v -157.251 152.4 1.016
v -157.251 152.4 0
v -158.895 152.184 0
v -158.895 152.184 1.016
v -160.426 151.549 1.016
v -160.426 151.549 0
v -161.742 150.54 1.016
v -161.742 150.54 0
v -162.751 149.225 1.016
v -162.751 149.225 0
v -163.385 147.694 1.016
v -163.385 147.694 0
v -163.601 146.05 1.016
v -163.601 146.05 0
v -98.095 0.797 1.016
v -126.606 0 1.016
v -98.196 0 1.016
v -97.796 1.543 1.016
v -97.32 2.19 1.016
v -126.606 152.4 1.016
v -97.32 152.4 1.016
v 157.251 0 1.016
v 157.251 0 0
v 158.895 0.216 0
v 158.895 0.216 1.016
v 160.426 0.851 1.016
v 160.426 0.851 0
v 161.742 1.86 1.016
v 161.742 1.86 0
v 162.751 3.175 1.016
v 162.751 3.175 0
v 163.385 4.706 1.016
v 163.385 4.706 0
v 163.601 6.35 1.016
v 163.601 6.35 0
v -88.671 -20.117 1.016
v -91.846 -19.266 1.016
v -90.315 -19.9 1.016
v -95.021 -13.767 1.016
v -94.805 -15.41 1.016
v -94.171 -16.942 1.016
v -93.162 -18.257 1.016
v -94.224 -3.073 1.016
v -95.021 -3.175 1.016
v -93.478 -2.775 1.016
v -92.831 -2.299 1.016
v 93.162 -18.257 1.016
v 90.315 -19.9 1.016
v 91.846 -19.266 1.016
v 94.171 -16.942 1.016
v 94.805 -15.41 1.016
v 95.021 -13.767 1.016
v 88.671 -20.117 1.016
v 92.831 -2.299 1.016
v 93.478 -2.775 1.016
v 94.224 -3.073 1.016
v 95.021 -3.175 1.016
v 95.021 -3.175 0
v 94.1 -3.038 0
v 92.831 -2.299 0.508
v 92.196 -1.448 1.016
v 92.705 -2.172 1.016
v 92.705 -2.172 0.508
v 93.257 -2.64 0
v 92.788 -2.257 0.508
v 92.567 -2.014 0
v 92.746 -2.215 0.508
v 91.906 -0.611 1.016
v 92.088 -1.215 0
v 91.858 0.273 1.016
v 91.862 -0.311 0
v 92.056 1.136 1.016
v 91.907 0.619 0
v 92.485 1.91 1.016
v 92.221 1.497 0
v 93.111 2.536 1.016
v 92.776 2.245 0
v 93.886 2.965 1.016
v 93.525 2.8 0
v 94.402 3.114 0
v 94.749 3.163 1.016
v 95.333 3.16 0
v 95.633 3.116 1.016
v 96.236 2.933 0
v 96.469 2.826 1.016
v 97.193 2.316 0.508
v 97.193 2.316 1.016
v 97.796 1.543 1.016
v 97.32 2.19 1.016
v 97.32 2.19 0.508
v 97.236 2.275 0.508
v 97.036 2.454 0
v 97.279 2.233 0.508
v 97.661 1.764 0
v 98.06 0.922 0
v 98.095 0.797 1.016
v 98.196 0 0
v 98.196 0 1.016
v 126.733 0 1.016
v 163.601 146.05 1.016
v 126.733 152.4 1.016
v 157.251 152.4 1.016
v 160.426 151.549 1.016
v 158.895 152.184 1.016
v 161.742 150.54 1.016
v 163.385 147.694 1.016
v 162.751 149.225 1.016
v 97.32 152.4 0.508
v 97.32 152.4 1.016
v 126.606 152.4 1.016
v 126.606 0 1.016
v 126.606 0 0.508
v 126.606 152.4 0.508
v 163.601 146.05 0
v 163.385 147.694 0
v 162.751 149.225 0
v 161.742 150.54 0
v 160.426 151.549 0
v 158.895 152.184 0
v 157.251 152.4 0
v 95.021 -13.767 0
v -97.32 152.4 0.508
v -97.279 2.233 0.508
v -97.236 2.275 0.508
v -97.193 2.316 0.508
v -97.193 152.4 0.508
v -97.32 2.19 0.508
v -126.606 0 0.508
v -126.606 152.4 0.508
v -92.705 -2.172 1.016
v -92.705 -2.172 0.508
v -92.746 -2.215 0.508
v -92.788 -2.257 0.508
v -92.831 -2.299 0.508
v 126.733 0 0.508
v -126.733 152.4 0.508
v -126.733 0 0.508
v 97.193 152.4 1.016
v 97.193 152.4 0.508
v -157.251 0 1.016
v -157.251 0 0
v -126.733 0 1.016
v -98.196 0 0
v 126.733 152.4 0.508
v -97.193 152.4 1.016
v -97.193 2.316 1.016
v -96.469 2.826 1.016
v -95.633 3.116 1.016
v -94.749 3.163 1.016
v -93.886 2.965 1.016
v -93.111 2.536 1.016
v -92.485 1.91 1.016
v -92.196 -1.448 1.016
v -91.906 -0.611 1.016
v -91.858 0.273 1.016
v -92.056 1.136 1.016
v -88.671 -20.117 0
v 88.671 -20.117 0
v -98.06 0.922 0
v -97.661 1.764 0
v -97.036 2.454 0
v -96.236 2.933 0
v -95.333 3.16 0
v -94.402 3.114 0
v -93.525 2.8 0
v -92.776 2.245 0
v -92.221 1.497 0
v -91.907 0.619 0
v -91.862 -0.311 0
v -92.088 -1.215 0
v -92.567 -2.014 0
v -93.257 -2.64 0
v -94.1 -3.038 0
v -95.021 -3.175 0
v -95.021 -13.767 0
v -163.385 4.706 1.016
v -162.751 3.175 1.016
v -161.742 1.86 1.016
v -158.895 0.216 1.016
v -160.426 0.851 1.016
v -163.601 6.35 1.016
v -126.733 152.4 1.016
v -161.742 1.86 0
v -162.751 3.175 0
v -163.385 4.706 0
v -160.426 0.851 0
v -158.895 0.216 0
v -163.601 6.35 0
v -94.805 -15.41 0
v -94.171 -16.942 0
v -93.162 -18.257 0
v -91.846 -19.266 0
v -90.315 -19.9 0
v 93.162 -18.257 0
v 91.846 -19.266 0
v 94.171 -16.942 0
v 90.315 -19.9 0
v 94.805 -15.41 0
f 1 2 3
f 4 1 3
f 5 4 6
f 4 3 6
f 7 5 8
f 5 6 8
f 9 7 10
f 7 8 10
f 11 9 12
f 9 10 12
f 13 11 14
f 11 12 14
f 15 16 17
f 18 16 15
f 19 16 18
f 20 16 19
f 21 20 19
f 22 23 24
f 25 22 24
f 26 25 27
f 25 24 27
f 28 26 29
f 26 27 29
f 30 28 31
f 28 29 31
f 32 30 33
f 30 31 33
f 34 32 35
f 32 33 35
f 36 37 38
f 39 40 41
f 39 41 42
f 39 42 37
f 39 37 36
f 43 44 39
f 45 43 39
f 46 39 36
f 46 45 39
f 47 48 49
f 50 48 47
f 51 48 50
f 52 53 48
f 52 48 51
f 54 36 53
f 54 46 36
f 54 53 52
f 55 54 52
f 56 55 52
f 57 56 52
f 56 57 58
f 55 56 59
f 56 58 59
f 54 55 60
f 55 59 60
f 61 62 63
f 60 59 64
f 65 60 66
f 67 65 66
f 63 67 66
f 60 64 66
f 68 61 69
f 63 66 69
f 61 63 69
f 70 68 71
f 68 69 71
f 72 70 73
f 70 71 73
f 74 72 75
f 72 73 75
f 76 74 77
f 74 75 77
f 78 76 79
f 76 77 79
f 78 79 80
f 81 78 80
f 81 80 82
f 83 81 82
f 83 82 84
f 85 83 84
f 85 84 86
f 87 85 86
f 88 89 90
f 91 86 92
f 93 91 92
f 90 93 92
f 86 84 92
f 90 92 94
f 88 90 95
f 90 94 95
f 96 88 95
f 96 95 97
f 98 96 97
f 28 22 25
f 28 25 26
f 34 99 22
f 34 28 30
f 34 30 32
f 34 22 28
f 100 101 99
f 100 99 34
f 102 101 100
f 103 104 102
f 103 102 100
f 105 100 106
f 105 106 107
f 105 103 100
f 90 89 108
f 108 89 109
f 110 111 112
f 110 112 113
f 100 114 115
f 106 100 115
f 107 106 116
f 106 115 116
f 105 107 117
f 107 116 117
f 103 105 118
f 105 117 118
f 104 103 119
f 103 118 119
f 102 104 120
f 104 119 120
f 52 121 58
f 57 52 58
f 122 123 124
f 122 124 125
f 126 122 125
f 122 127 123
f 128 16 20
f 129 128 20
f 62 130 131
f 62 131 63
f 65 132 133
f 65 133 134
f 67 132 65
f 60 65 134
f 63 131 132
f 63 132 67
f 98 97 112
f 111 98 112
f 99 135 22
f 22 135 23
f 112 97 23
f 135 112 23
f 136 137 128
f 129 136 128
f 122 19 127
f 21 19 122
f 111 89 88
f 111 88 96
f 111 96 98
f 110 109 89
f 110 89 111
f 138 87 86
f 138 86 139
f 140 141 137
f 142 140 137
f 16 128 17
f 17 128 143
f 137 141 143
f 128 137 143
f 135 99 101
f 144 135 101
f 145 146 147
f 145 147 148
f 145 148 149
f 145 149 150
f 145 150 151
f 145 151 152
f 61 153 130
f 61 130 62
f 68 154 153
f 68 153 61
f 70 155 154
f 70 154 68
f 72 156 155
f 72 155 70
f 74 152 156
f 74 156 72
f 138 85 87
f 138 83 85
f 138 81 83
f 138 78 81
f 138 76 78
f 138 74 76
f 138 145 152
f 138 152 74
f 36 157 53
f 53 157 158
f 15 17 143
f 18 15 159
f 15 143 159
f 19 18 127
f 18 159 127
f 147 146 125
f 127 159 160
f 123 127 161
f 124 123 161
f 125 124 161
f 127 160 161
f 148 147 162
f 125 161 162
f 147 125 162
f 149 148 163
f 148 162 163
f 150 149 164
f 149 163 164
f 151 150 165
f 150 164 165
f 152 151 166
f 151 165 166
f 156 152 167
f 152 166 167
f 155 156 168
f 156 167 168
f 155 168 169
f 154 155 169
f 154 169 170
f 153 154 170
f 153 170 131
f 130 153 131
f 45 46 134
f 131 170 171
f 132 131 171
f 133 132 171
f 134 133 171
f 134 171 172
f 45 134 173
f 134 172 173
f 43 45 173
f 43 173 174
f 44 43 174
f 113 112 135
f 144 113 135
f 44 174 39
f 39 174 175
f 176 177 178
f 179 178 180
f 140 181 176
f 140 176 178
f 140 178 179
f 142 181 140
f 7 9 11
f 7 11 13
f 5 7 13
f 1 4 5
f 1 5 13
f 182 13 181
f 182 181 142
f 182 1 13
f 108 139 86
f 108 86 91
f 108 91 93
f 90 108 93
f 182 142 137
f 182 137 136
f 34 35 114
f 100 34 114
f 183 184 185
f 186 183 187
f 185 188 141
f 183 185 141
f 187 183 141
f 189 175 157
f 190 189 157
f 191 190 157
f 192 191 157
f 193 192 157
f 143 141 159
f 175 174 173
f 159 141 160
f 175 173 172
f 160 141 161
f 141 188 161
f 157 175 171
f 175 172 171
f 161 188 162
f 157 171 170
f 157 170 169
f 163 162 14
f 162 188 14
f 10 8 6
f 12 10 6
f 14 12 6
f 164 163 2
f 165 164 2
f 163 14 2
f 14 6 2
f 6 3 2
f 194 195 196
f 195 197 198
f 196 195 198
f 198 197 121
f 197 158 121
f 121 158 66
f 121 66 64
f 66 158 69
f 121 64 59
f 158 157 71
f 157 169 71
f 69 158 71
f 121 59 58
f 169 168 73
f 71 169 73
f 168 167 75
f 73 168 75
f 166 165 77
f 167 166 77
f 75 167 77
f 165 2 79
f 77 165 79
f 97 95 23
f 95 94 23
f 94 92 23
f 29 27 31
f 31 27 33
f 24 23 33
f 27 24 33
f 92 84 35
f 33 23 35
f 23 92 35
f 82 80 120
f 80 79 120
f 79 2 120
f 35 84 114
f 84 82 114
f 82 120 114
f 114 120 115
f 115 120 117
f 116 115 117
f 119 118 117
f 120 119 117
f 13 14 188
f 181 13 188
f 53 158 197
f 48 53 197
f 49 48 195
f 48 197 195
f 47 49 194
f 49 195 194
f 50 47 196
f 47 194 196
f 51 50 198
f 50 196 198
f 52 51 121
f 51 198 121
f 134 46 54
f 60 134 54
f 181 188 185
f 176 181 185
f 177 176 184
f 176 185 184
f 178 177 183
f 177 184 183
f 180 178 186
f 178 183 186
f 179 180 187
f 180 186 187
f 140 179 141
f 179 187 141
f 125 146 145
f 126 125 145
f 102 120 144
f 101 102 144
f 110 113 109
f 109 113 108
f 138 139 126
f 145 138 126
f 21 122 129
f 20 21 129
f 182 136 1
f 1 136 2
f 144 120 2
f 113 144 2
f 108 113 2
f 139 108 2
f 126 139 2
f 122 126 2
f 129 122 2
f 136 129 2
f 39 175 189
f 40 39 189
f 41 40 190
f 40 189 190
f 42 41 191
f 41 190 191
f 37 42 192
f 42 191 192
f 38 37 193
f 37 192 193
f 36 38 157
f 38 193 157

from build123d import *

# Parameters (mm, degrees)
F0_W     = 190.0428
F0_H     = 2.1717
F0_W_2   = 0.127
F0_H_2   = 152.4
F0_H_3   = 0.127
F1_DEPTH = 1.016
F2_W     = 0.127
F2_H     = 152.4
F2_W_2   = 190.0428
F2_H_2   = 0.127
F3_DEPTH = 0.508
F5_D     = 6.35


with BuildPart() as f1:
    # F0 (on Top) → F1 (new body)
    with BuildSketch(Plane.XY):
        Polygon((-97.1931, 0), (-95.0214, 0), (95.0214, 0), (97.1931, 0), (97.1931, 152.4), (95.0214, 152.4), (-95.0214, 152.4), (-97.1931, 152.4), align=None)
        with Locations((0, -1.08585)):
            Rectangle(F0_W, F0_H)
        with Locations((-97.2566, 76.2)):
            Rectangle(F0_W_2, F0_H_2)
        with Locations((0, -2.2352)):
            Rectangle(F0_W, F0_H_3)
        with Locations((97.2566, 76.2)):
            Rectangle(F0_W_2, F0_H_2)
        Polygon((-99.4918, 0), (-97.3201, 0), (-97.3201, 152.4), (-99.4918, 152.4), (-124.4346, 152.4), (-126.6063, 152.4), (-126.6063, 0), (-124.4346, 0), align=None)
        with Locations((0, -3.38455)):
            Rectangle(F0_W, F0_H)
        Polygon((97.3201, 152.4), (97.3201, 0), (99.4918, 0), (124.4346, 0), (126.6063, 0), (126.6063, 152.4), (124.4346, 152.4), (99.4918, 152.4), align=None)
        with BuildLine():
            Line((95.0214, -4.4704), (-95.0214, -4.4704))
            Line((-95.0214, -4.4704), (-95.0214, -13.7668))
            ThreePointArc((-95.0214, -13.7668), (-93.161528, -18.256928), (-88.6714, -20.1168))
            Line((-88.6714, -20.1168), (88.6714, -20.1168))
            ThreePointArc((88.6714, -20.1168), (93.161528, -18.256928), (95.0214, -13.7668))
            Line((95.0214, -13.7668), (95.0214, -4.4704))
        make_face()
        with Locations((-126.6698, 76.2)):
            Rectangle(F0_W_2, F0_H_2)
        with Locations((126.6698, 76.2)):
            Rectangle(F0_W_2, F0_H_2)
        with BuildLine():
            Line((-128.905, 0), (-126.7333, 0))
            Line((-126.7333, 0), (-126.7333, 152.4))
            Line((-126.7333, 152.4), (-128.905, 152.4))
            Line((-128.905, 152.4), (-157.2514, 152.4))
            ThreePointArc((-157.2514, 152.4), (-161.741528, 150.540128), (-163.6014, 146.05))
            Line((-163.6014, 146.05), (-163.6014, 6.35))
            ThreePointArc((-163.6014, 6.35), (-161.741528, 1.859872), (-157.2514, 0))
            Line((-157.2514, 0), (-128.905, 0))
        make_face()
        with BuildLine():
            Line((126.7333, 152.4), (126.7333, 0))
            Line((126.7333, 0), (128.905, 0))
            Line((128.905, 0), (157.2514, 0))
            ThreePointArc((157.2514, 0), (161.741528, 1.859872), (163.6014, 6.35))
            Line((163.6014, 6.35), (163.6014, 146.05))
            ThreePointArc((163.6014, 146.05), (161.741528, 150.540128), (157.2514, 152.4))
            Line((157.2514, 152.4), (128.905, 152.4))
            Line((128.905, 152.4), (126.7333, 152.4))
        make_face()
    extrude(amount=F1_DEPTH)

    # F2 (on face) → F3 (cut)
    with BuildSketch(Plane.XY.offset(1.016)):
        with Locations((-126.6698, 76.2)):
            Rectangle(F2_W, F2_H)
        with Locations((-97.2566, 76.2)):
            Rectangle(F2_W, F2_H)
        with Locations((97.2566, 76.2)):
            Rectangle(F2_W, F2_H)
        with Locations((126.6698, 76.2)):
            Rectangle(F2_W, F2_H)
        with Locations((0, -2.2352)):
            Rectangle(F2_W_2, F2_H_2)
    extrude(amount=-F3_DEPTH, mode=Mode.SUBTRACT)

    # F5 (through all)
    with Locations(Plane.XY.offset(1.016)):
        with Locations((95.0214, 0), (-95.0214, 0)):
            Hole(F5_D / 2)


solid = f1.part
